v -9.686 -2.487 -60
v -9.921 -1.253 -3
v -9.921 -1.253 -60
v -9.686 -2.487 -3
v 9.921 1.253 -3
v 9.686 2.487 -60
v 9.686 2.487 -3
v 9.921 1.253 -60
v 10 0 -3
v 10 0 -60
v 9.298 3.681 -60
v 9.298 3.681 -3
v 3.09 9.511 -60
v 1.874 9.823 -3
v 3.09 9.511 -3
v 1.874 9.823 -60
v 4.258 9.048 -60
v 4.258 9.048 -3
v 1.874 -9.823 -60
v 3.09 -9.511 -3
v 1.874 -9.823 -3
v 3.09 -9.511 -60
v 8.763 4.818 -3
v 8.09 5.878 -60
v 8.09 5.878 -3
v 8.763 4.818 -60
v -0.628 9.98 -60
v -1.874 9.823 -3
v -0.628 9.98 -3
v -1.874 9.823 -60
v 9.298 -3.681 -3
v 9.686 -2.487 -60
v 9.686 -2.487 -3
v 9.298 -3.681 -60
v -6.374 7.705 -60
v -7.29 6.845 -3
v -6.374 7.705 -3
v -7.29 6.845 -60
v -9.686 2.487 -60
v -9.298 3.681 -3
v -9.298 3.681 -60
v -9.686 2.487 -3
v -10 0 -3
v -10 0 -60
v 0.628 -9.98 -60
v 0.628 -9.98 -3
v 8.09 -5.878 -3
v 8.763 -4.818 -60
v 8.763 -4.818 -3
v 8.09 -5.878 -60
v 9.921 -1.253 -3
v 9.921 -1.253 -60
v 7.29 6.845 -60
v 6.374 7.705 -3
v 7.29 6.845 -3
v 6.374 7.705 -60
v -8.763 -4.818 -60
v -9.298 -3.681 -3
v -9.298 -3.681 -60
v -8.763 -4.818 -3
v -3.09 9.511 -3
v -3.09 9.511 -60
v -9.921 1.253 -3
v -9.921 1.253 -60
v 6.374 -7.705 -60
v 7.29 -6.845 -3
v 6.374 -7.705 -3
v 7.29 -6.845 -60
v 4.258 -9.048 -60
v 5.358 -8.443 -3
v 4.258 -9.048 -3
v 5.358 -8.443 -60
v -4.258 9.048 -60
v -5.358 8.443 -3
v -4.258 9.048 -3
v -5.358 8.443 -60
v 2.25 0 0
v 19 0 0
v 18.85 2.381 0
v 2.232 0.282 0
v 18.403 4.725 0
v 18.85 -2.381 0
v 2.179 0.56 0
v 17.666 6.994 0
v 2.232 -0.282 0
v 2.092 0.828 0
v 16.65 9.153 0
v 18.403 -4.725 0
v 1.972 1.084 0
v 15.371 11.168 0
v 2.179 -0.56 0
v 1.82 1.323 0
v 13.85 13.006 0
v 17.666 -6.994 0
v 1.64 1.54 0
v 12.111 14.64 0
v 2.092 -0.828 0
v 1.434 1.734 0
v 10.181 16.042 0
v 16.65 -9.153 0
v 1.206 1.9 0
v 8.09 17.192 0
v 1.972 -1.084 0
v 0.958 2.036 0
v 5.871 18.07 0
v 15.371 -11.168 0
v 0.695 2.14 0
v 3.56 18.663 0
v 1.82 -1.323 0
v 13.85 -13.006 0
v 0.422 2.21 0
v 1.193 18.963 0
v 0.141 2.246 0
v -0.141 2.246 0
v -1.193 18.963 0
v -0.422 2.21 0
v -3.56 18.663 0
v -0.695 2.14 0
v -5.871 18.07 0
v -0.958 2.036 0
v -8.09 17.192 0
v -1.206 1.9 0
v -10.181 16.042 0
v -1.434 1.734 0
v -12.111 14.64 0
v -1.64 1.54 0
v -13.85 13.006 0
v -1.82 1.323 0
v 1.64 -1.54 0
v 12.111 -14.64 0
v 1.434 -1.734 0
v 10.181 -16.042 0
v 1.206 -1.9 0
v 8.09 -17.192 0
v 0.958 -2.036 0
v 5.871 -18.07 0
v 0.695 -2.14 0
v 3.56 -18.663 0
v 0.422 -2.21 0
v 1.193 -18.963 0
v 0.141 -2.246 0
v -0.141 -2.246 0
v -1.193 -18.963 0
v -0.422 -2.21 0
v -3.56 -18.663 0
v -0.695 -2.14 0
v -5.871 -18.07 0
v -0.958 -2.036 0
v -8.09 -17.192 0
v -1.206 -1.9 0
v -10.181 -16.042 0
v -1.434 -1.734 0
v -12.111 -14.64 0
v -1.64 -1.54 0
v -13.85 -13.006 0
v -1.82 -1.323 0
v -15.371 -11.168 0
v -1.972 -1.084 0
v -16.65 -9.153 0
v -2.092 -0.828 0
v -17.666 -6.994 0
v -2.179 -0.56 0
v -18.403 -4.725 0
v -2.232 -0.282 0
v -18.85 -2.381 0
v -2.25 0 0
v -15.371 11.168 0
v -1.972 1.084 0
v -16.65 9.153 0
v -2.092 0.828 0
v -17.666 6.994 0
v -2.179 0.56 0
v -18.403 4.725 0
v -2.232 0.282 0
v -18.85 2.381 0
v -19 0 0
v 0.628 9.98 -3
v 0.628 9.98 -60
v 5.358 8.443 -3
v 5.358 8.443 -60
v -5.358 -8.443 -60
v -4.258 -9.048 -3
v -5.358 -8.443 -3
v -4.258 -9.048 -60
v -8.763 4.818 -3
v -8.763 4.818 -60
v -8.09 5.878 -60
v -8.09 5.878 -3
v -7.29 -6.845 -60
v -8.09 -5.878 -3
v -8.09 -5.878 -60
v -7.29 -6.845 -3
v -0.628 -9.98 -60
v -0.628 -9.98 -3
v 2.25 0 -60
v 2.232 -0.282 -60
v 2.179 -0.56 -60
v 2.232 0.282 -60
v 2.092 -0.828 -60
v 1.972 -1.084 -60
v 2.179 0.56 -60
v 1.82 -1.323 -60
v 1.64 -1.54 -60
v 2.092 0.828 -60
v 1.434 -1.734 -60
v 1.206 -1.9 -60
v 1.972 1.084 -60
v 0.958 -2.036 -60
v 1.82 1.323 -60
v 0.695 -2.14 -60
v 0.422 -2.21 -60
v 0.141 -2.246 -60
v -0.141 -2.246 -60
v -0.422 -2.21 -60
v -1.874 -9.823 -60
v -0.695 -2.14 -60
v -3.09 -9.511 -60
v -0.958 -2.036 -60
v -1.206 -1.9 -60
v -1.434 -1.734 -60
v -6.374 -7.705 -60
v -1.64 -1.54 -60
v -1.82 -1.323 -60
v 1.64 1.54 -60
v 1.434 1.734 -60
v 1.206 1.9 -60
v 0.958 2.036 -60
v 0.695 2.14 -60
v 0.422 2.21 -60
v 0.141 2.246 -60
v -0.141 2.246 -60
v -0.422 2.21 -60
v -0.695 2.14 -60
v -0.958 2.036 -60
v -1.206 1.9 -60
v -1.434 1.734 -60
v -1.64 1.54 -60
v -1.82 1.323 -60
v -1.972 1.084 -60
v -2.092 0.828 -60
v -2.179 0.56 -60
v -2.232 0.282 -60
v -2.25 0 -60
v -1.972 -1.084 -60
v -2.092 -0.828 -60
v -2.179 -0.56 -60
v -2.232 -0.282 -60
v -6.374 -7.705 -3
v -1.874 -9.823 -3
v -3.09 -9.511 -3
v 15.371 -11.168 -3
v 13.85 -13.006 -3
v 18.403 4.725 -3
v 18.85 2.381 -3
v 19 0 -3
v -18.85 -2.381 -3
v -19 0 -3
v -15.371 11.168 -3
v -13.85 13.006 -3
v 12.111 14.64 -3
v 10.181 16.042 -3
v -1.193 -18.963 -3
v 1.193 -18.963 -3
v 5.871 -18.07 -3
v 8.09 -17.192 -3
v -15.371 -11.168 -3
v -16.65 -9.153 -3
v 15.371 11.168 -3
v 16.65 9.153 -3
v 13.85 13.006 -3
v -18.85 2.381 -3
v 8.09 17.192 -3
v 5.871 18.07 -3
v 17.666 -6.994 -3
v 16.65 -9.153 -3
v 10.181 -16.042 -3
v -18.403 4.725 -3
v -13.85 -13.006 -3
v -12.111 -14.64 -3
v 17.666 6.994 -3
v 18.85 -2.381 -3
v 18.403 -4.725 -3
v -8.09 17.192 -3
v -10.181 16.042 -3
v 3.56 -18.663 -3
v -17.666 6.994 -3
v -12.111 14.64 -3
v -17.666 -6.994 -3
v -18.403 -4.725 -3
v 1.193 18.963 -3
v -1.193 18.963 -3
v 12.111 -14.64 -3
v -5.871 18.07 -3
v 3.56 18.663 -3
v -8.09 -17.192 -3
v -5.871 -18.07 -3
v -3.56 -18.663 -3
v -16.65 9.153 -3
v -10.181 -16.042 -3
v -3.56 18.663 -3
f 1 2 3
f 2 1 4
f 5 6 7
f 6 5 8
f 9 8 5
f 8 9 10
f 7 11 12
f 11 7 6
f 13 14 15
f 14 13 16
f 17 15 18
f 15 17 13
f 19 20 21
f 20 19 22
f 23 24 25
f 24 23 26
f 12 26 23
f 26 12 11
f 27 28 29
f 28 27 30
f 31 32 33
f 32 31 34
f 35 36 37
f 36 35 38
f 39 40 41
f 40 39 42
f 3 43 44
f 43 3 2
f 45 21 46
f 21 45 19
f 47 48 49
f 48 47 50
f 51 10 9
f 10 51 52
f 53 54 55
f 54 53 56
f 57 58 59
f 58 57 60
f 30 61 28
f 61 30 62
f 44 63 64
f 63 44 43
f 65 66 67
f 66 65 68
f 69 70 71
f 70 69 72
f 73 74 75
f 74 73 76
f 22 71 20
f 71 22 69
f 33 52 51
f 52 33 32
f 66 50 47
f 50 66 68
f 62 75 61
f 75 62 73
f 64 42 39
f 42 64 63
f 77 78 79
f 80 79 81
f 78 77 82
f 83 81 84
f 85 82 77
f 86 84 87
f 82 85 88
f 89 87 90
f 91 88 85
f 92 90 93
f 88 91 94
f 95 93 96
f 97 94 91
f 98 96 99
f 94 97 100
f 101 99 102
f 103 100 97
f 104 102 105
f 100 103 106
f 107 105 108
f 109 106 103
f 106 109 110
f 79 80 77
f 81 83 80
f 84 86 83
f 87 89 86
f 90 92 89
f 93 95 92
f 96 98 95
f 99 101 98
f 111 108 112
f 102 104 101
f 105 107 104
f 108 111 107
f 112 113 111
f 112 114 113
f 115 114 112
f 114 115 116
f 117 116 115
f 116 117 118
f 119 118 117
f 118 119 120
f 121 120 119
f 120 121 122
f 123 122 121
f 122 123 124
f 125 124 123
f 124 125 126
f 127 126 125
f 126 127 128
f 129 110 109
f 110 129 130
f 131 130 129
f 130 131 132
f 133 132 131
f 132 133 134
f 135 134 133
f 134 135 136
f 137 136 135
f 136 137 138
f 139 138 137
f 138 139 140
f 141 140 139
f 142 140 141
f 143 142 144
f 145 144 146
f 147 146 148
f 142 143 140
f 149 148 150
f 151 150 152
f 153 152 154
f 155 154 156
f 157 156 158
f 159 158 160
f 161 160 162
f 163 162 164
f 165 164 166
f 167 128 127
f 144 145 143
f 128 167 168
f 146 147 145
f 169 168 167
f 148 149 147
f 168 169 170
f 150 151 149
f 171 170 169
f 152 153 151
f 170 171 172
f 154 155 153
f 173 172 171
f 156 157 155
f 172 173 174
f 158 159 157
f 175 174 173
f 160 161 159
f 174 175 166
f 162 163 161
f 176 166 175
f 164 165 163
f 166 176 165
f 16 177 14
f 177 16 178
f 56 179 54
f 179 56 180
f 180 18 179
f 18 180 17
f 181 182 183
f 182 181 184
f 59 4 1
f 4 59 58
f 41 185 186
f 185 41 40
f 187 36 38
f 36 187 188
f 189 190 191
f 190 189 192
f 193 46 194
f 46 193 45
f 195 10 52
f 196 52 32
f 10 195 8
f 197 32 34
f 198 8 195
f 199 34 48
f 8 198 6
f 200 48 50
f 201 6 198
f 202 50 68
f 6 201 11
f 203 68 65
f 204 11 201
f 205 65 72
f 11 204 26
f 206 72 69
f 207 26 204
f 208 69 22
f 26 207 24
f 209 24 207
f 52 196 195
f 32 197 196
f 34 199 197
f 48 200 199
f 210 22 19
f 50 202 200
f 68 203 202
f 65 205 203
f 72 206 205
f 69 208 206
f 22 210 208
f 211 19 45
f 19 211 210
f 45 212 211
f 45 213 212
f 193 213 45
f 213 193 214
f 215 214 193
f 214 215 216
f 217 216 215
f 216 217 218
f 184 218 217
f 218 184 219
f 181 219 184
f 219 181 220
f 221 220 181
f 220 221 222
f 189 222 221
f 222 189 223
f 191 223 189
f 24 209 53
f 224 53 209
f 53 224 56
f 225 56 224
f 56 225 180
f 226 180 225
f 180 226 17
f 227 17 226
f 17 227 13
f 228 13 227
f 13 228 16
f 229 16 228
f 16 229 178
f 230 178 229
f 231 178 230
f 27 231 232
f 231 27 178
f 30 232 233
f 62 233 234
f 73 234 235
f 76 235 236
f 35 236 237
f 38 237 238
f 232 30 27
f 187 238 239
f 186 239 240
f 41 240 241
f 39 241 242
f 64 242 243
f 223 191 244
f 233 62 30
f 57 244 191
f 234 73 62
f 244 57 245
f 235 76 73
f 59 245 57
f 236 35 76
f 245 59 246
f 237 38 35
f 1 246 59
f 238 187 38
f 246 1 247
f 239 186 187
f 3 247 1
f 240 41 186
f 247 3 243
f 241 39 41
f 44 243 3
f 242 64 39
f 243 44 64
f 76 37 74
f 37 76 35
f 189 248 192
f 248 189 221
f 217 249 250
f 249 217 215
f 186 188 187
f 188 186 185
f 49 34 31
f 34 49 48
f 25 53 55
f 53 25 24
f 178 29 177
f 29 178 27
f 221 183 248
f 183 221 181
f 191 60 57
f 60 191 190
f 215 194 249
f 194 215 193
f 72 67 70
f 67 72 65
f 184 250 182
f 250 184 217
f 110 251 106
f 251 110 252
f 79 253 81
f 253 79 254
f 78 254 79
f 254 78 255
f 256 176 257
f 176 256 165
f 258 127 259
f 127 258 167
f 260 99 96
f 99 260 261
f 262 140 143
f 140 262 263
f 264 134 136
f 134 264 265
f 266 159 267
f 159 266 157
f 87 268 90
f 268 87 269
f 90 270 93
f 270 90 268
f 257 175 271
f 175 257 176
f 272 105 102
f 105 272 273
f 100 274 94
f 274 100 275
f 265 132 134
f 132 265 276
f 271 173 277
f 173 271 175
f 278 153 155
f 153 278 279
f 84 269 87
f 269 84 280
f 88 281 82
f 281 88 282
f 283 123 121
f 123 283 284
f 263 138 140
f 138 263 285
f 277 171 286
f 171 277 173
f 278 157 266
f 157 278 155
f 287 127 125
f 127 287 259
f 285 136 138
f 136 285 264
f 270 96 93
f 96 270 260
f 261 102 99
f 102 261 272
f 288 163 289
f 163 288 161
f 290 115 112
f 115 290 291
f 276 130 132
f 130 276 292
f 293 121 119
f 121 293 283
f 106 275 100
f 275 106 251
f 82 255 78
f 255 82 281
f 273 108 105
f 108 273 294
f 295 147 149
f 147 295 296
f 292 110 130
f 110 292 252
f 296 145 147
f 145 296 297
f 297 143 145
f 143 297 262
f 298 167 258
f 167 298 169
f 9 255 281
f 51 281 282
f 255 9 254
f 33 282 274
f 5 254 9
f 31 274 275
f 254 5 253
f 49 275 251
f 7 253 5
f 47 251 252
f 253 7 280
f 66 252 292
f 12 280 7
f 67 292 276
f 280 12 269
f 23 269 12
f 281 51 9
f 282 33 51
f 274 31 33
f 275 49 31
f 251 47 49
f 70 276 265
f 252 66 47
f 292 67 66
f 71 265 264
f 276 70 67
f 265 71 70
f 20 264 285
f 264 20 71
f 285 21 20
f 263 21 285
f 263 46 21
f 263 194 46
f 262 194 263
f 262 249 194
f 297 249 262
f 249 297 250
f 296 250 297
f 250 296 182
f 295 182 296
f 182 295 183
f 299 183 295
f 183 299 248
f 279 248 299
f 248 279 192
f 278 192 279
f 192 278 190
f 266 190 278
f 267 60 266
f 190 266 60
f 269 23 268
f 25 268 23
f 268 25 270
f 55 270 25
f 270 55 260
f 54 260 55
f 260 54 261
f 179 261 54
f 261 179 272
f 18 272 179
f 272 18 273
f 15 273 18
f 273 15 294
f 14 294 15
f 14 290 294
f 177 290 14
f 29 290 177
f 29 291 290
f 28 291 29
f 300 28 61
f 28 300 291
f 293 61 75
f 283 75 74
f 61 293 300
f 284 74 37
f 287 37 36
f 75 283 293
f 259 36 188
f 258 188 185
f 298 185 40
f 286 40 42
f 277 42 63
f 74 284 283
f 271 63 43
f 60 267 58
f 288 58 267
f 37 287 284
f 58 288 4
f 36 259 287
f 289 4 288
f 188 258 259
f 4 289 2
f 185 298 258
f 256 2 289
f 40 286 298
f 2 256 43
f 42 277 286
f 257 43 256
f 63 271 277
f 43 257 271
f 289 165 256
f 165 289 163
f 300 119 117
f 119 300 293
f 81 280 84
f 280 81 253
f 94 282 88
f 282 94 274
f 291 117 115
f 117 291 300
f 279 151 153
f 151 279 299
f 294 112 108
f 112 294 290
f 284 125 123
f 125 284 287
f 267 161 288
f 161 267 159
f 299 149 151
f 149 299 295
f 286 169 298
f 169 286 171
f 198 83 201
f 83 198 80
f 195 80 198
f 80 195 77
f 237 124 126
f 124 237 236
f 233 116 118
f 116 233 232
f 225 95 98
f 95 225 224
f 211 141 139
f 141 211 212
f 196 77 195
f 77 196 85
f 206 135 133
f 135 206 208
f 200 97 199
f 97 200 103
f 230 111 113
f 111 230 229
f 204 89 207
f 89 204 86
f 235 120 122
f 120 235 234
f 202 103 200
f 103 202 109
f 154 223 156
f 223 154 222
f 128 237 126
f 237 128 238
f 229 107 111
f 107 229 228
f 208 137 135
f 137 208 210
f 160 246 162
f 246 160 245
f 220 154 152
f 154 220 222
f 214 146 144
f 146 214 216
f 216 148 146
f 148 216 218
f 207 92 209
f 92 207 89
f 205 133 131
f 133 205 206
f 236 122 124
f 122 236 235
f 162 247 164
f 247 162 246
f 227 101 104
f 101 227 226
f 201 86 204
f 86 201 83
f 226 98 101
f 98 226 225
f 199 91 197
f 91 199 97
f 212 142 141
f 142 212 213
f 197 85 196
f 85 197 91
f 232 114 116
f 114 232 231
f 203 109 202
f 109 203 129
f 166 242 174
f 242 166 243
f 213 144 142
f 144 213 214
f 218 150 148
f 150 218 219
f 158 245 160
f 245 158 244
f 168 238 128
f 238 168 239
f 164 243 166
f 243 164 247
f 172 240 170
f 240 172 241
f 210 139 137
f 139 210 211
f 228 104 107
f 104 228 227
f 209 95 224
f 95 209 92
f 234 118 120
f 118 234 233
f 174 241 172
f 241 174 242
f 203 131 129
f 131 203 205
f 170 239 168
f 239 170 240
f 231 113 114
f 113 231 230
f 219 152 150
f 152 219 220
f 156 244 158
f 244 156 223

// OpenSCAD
$fn = 50;


difference() {
	union() {
		translate(v = [0, 0, -60.0000000000]) {
			cylinder(h = 60, r = 10.0000000000);
		}
		translate(v = [0, 0, -3.0000000000]) {
			cylinder(h = 3, r = 19.0000000000);
		}
	}
	union() {
		#translate(v = [0, 0, -60]) {
			cylinder(h = 60, r = 2.2500000000);
		}
	}
}
